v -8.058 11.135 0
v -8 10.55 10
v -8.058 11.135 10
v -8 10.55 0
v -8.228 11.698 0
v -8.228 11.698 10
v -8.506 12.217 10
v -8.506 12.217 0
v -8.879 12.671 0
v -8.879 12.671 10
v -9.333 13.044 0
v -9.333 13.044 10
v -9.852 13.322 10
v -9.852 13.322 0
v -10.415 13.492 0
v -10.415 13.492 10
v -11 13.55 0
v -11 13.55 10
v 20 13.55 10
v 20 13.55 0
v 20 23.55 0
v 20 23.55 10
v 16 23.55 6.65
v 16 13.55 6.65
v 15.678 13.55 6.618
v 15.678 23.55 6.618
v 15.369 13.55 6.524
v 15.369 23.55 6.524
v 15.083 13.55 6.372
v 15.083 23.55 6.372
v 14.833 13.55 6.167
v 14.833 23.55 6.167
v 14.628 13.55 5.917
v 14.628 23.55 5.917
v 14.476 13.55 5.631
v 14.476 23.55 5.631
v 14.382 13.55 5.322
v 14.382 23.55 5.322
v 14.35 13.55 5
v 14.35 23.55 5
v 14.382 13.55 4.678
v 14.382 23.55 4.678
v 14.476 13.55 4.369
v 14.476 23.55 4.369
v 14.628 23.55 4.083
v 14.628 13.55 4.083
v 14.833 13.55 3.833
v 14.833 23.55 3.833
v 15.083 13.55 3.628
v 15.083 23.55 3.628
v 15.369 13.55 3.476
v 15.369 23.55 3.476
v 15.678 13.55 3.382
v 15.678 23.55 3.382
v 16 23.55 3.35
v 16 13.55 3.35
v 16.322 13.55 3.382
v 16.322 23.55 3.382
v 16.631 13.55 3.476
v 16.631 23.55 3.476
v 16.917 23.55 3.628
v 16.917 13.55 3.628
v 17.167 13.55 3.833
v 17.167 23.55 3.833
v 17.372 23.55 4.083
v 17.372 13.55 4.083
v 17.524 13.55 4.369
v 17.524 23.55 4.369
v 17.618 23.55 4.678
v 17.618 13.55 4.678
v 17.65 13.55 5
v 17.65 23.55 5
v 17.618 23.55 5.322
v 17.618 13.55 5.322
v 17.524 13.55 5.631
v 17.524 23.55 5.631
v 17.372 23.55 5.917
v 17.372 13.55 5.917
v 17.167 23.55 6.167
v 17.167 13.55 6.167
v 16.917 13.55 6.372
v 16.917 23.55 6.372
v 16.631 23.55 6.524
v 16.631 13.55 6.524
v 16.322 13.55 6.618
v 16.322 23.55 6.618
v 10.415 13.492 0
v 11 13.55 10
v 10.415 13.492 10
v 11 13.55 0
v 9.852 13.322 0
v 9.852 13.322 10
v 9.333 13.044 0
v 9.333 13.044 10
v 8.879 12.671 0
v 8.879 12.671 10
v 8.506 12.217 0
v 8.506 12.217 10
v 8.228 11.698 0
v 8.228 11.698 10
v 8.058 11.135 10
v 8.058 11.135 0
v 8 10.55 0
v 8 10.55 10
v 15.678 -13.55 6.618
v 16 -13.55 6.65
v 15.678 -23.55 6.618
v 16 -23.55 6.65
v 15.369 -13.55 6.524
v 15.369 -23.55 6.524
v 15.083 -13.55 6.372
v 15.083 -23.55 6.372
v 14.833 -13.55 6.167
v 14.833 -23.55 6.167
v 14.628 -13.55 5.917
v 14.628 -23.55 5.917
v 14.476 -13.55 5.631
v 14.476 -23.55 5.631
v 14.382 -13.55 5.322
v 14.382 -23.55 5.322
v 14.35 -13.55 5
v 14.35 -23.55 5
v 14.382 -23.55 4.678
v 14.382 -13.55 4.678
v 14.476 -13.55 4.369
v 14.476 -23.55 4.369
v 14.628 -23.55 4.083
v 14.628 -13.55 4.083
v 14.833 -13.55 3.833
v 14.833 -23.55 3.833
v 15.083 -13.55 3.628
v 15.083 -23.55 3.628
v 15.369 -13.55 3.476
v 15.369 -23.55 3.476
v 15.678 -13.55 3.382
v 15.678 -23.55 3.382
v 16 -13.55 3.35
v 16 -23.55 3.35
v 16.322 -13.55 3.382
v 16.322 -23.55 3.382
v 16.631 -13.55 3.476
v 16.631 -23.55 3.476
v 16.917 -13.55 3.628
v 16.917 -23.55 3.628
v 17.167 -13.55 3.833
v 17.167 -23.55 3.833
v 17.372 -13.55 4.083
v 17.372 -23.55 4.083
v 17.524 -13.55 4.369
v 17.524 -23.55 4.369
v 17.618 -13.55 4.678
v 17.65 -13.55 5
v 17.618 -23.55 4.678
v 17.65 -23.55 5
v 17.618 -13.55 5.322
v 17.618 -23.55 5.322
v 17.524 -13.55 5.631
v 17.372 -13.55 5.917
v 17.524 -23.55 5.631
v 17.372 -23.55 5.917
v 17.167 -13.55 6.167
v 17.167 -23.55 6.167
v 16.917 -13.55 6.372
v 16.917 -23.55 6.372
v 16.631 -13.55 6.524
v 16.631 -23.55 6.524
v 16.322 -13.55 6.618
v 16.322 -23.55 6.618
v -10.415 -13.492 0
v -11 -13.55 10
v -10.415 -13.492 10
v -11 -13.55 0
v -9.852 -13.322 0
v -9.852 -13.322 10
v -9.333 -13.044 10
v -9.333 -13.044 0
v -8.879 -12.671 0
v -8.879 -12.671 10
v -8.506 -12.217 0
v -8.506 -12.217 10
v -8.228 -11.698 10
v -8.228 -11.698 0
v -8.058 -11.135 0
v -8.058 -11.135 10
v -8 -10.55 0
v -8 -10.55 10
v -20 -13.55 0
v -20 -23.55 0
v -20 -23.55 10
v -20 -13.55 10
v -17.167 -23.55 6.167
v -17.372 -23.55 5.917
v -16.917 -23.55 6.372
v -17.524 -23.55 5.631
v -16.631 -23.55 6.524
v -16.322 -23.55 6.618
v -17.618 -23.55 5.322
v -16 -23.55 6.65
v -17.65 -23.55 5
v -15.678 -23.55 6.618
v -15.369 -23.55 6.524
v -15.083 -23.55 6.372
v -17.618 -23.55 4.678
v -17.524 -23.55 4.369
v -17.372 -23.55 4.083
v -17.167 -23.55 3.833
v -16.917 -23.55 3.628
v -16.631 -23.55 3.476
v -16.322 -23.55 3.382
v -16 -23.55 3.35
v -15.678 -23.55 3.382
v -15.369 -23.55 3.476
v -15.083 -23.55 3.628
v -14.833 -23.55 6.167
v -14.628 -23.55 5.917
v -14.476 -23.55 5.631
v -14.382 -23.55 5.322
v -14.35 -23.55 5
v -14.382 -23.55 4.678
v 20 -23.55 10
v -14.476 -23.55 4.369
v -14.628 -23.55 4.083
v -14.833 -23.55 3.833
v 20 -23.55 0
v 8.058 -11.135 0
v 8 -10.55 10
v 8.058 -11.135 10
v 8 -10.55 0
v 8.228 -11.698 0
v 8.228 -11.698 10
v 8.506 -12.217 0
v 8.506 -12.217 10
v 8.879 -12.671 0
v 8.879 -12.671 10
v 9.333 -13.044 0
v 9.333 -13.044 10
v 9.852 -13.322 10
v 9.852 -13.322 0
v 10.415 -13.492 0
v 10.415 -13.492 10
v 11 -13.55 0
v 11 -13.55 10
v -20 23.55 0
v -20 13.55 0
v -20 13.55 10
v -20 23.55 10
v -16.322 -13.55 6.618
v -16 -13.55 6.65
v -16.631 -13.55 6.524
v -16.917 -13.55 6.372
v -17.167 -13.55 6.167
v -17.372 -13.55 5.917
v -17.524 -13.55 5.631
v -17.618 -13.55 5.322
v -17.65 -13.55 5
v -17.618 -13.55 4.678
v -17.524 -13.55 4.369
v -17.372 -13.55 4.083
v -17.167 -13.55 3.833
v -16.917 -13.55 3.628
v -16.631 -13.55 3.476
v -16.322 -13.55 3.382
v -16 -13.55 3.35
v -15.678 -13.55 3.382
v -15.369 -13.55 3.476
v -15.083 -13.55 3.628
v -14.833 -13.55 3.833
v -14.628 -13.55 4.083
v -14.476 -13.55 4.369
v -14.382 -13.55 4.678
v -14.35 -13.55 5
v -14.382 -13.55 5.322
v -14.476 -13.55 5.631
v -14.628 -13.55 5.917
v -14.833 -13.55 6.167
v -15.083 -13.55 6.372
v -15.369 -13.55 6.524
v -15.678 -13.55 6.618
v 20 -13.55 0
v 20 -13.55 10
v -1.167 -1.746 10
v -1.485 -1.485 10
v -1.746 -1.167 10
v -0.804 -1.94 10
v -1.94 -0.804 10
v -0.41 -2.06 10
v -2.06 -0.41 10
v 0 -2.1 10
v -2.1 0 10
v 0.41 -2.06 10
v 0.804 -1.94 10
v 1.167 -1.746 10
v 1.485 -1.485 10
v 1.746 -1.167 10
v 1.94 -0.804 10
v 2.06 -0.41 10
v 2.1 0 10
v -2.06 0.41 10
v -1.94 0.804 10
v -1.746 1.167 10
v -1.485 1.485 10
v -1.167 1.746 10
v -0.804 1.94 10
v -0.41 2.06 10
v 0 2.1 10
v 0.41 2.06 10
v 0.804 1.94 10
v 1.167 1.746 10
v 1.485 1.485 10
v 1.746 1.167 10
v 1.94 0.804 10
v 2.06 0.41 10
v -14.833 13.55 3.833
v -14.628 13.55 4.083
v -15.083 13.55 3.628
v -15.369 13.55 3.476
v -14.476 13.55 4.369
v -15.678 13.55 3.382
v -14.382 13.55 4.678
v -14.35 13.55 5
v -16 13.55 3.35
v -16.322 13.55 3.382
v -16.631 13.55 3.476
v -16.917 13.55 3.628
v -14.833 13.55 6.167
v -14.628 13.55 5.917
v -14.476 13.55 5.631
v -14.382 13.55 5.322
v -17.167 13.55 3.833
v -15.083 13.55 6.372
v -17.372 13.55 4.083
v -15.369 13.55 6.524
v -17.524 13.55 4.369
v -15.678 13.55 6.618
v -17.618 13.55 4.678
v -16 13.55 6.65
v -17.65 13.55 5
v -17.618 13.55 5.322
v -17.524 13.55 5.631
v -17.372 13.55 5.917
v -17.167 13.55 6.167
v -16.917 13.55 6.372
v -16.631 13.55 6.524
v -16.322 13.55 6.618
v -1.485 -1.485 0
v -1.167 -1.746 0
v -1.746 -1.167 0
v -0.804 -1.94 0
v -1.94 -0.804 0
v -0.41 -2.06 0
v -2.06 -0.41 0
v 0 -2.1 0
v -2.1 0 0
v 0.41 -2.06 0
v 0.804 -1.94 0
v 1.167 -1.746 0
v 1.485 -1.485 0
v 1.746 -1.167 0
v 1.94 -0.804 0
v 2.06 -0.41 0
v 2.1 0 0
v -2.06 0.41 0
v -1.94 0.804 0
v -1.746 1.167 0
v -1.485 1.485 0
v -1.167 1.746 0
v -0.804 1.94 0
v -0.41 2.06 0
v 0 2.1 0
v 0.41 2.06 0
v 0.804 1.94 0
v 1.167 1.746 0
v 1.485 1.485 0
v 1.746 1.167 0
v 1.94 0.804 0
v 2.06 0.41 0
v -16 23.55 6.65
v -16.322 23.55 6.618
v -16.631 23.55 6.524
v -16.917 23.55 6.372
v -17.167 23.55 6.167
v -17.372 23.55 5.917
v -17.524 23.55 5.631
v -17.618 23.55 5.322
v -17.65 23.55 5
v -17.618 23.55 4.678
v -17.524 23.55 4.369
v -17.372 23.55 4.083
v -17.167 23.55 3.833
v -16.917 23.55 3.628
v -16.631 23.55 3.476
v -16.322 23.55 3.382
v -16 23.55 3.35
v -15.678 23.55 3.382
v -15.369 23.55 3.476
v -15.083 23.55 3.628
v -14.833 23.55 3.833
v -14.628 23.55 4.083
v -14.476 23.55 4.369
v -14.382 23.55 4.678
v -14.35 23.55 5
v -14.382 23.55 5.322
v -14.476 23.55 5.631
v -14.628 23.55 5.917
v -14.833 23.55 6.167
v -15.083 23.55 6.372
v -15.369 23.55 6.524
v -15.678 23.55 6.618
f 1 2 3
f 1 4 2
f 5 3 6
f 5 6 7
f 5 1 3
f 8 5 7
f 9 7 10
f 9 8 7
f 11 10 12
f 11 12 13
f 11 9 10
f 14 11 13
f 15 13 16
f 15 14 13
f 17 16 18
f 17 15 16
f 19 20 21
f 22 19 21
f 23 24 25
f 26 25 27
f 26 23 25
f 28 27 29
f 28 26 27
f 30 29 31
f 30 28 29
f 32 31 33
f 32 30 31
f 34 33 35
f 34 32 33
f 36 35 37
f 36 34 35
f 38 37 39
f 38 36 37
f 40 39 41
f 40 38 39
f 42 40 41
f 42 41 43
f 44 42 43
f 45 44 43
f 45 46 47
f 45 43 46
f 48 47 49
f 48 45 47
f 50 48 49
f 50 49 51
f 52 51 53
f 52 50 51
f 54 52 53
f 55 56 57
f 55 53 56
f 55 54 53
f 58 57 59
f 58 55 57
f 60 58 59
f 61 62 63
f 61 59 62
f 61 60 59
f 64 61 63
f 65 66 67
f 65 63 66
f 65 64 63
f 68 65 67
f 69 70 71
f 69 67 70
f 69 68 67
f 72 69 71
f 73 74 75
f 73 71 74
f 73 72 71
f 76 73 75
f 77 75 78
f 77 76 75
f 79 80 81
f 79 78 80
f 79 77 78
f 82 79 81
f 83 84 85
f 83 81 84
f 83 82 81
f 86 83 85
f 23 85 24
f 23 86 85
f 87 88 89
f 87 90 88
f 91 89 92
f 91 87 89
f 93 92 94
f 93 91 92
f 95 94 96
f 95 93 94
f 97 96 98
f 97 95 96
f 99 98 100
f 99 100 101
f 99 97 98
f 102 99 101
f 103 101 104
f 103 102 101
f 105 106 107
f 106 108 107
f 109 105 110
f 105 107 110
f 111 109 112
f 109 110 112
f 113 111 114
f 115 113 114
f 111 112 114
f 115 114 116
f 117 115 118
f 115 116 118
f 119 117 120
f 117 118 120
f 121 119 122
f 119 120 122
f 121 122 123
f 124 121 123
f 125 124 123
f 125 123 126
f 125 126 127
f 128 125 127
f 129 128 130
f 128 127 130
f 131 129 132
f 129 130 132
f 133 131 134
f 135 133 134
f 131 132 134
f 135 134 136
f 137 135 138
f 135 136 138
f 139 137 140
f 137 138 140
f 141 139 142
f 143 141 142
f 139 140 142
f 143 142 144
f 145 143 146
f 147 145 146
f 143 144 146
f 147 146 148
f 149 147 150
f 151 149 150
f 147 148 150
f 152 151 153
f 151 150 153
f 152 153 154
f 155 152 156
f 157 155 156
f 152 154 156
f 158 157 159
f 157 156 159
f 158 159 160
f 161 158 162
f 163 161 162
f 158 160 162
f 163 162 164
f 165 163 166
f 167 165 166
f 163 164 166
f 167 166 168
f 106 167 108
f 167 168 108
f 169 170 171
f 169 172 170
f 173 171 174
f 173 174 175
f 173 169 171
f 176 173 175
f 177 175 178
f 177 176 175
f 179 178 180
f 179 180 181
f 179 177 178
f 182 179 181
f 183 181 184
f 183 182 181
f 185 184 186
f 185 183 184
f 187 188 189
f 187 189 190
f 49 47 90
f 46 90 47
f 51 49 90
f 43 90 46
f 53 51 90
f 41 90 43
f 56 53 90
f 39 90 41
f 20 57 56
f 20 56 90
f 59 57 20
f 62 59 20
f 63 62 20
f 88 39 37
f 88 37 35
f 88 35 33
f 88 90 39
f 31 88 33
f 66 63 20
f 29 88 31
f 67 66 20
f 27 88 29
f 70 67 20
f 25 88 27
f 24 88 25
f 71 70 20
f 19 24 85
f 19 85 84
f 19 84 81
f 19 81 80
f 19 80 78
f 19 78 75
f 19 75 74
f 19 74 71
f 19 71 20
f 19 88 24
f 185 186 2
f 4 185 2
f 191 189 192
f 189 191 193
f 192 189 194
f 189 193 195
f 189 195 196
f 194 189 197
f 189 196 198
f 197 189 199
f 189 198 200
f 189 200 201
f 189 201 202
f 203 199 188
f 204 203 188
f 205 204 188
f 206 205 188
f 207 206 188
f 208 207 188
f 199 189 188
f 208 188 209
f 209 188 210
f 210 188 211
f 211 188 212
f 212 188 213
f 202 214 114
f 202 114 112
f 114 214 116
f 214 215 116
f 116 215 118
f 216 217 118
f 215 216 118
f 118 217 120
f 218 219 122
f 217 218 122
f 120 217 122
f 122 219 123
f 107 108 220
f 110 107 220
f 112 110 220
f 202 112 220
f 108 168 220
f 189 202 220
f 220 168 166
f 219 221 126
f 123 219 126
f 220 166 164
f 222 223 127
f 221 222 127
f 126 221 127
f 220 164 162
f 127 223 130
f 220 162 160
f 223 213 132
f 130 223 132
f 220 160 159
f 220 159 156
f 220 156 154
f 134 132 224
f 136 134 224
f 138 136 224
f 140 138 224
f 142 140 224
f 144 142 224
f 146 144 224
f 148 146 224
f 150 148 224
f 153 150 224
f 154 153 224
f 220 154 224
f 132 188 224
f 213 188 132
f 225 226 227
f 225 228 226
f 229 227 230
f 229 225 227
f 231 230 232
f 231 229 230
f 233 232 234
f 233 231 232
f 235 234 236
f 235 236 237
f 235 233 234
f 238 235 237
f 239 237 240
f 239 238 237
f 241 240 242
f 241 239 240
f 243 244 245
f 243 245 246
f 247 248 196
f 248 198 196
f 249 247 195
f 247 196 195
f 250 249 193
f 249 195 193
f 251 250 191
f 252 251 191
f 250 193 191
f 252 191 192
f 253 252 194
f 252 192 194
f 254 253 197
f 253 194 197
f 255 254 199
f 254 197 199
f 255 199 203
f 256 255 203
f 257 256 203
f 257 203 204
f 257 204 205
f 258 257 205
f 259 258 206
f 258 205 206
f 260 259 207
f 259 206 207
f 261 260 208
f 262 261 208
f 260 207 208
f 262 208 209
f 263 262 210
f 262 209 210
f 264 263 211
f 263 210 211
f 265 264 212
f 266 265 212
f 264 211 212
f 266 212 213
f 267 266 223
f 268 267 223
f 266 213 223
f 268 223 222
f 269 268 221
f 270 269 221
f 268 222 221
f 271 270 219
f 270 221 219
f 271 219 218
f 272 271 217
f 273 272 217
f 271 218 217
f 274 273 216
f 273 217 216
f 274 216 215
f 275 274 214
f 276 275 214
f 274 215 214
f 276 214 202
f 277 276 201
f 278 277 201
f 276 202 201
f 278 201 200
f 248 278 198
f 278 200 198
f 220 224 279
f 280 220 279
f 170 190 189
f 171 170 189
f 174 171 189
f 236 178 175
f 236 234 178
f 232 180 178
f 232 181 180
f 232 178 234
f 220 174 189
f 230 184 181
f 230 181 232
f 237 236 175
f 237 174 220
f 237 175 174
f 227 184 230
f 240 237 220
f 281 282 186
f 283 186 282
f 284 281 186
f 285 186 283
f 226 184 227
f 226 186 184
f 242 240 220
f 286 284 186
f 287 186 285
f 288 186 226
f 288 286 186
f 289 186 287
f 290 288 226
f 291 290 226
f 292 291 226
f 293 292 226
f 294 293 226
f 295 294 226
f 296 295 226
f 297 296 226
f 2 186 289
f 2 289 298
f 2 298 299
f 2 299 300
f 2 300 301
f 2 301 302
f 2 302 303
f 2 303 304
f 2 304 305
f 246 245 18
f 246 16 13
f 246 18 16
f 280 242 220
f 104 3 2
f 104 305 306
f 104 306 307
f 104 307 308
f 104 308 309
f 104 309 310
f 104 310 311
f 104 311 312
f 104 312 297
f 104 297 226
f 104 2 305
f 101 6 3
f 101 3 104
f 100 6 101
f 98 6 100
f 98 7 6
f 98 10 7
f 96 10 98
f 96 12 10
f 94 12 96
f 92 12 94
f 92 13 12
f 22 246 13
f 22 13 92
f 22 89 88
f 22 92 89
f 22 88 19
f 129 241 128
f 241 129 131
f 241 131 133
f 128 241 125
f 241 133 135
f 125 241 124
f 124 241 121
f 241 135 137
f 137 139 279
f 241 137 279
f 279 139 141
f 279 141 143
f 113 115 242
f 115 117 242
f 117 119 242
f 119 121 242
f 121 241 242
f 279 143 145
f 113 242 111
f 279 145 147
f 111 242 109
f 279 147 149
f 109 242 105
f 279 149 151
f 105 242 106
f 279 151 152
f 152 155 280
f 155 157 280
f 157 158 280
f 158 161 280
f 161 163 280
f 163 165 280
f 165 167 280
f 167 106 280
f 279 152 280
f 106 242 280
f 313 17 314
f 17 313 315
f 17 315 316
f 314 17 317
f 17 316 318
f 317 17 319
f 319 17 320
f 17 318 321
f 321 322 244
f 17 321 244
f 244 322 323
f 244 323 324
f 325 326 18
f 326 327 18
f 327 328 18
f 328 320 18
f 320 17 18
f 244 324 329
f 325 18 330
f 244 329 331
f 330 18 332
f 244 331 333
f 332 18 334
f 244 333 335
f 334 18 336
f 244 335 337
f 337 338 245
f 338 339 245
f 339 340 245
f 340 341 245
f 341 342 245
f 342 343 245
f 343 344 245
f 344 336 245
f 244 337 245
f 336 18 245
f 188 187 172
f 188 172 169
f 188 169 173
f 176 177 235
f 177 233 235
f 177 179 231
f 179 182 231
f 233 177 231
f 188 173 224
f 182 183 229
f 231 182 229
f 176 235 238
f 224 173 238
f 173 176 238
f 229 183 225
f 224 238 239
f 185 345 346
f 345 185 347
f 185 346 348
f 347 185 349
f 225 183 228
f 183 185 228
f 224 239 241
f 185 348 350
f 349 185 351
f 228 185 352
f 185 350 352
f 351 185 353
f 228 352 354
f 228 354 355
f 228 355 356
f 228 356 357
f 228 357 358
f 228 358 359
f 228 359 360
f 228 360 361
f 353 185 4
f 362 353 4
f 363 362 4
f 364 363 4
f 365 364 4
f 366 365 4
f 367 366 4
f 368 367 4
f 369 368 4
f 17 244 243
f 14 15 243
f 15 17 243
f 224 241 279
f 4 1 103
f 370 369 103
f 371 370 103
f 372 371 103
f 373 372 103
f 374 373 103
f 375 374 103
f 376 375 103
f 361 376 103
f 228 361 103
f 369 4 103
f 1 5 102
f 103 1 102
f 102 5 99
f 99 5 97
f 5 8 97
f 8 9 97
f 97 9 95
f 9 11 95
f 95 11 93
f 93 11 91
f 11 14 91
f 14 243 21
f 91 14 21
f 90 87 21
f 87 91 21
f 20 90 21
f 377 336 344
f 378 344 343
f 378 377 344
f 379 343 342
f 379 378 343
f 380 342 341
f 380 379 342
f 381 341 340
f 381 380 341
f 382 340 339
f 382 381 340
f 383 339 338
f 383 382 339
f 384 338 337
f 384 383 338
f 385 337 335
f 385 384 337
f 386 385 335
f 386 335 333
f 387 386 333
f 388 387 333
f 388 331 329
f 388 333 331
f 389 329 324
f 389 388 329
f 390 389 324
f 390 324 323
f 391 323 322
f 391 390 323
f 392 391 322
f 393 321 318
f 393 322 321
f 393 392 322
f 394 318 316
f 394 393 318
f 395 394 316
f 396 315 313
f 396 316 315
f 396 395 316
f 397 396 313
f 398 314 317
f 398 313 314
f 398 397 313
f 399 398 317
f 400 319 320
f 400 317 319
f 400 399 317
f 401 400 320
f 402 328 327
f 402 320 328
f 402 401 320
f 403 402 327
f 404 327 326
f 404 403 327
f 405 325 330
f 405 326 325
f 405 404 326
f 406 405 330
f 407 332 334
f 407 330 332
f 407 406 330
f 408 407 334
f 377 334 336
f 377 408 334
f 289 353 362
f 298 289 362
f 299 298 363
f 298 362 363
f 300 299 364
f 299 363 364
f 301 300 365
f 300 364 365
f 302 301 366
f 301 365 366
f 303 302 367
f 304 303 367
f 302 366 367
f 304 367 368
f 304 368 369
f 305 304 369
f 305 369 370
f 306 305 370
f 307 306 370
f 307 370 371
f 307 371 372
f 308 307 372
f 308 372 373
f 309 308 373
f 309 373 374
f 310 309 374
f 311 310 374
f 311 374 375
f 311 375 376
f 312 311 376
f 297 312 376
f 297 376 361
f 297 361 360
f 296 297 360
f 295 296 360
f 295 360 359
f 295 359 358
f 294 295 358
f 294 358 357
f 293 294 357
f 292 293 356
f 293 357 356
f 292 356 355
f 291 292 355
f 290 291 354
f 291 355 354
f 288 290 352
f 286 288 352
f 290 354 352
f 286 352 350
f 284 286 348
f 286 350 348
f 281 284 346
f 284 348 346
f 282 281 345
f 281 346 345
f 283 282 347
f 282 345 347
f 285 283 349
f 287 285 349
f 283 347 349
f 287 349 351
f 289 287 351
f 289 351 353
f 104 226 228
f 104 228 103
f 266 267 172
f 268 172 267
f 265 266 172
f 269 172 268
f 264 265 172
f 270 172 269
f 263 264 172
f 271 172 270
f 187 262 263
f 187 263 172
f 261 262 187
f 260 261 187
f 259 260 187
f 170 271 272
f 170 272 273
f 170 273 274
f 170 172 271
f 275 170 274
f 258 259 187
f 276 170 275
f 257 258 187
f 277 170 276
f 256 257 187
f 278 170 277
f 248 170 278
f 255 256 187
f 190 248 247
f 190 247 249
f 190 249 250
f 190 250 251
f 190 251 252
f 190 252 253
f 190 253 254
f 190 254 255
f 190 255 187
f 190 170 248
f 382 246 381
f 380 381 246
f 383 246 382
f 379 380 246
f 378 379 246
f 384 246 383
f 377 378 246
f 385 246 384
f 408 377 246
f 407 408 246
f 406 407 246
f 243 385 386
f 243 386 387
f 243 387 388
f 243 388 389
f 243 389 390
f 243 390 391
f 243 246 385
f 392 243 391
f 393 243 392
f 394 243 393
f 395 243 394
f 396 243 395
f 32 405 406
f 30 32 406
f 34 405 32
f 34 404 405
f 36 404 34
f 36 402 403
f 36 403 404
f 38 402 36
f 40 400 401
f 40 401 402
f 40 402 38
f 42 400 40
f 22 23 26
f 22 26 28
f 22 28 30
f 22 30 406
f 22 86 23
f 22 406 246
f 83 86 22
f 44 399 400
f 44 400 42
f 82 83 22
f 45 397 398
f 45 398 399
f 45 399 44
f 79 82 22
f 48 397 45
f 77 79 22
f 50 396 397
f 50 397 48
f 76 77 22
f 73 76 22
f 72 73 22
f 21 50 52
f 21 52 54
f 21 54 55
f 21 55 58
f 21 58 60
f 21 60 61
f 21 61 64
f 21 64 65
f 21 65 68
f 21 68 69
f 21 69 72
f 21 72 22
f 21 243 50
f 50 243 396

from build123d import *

# Parameters (mm, degrees)
SKETCH_1_W                  = 40
SKETCH_1_H                  = 47.1
EXTRUDE_1_DEPTH             = 10
HOLE_WIZARD_M4_1_AT_2_COUNT = 2
HOLE_WIZARD_M4_1_AT_2_PITCH = 32
HOLE_WIZARD_M5_1_D          = 4.2
HOLE_WIZARD_M5_1_DEPTH      = 12.4
HOLE_WIZARD_M5_1_TIP        = 1.2618073
CUT_EXTRUDE_1_REACH         = 34.475
SKETCH_8_W                  = 24
SKETCH_8_H                  = 27.1
FILLET_1_R                  = 3


with BuildPart() as part:
    # 草图1 → 凸台-拉伸1 (new body)
    with BuildSketch(Plane.XY):
        Rectangle(SKETCH_1_W, SKETCH_1_H)
    extrude(amount=EXTRUDE_1_DEPTH)

    # 草图4 → M4 螺纹孔1 (revolve, cut)
    with BuildSketch(Plane(origin=(-16, 23.55, 5), x_dir=(0, 0, 1), z_dir=(1, 0, 0))):
        Polygon((0, 0), (0, 11.091420021), (1.65, 10.1), (1.65, 0), align=None)
    hole_wizard_m4_1 = revolve(axis=Axis((-16, 29.9, 5), (0, -1, 0)), mode=Mode.SUBTRACT)

    # M4 螺纹孔1 at 2: M4 螺纹孔1 ×2
    with Locations(*[(i * HOLE_WIZARD_M4_1_AT_2_PITCH, 0, 0) for i in range(1, HOLE_WIZARD_M4_1_AT_2_COUNT)]):
        add(hole_wizard_m4_1, mode=Mode.SUBTRACT)

    # 镜向1: M4 螺纹孔1 across plane
    add(hole_wizard_m4_1.mirror(Plane.ZX), mode=Mode.SUBTRACT)

    # 镜向1 copy 1 sketch → 镜向1 copy 1 (revolve, cut)
    with BuildSketch(Plane(origin=(16, -23.55, 5), x_dir=(0, 0, 1), z_dir=(1, 0, 0))):
        Polygon((0, 0), (0, -11.091420021), (1.65, -10.1), (1.65, 0), align=None)
    revolve(axis=Axis((16, -29.9, 5), (0, -1, 0)), mode=Mode.SUBTRACT)

    # M5 螺纹孔1
    with Locations(Plane.XY.offset(10)):
        with Locations((0, 0)):
            Hole(HOLE_WIZARD_M5_1_D / 2, depth=HOLE_WIZARD_M5_1_DEPTH)
            with Locations((0, 0, -(HOLE_WIZARD_M5_1_DEPTH + HOLE_WIZARD_M5_1_TIP / 2))):  # 118° drill point
                Cone(0, HOLE_WIZARD_M5_1_D / 2, HOLE_WIZARD_M5_1_TIP, mode=Mode.SUBTRACT)

    # 切除-拉伸1: up to this face of the body (flat: up to its plane)
    cut_extrude_1_end = Plane(part.part.faces().sort_by_distance((0, -22.932067156, 0))[0])
    # 草图8 → 切除-拉伸1 (cut, up to the picked face)
    with BuildSketch(Plane.XY.offset(10), mode=Mode.PRIVATE) as cut_extrude_1_sk1:
        with Locations((20, 0)):
            Rectangle(SKETCH_8_W, SKETCH_8_H)
    cut_extrude_1_tool1 = split(extrude(cut_extrude_1_sk1.sketch, amount=-CUT_EXTRUDE_1_REACH, mode=Mode.PRIVATE), bisect_by=cut_extrude_1_end, keep=Keep.BOTH, mode=Mode.PRIVATE)
    cut_extrude_1 = cut_extrude_1_tool1.solids().sort_by(Axis((20, 0, 10), (0, 0, -1)))[0]
    add(cut_extrude_1, mode=Mode.SUBTRACT)

    # 镜向2: 切除-拉伸1 across plane
    add(cut_extrude_1.mirror(Plane(origin=(0, 0, 0), x_dir=(0, 0, 1), z_dir=(1, 0, 0))), mode=Mode.SUBTRACT)

    # 圆角1
    fillet_1_edges = [part.edges().sort_by_distance(p)[0] for p in [
        (8, 13.55, 5),
        (8, -13.55, 5),
        (-8, -13.55, 5),
        (-8, 13.55, 5),
    ]]
    fillet(fillet_1_edges, radius=FILLET_1_R)


solid = part.part
